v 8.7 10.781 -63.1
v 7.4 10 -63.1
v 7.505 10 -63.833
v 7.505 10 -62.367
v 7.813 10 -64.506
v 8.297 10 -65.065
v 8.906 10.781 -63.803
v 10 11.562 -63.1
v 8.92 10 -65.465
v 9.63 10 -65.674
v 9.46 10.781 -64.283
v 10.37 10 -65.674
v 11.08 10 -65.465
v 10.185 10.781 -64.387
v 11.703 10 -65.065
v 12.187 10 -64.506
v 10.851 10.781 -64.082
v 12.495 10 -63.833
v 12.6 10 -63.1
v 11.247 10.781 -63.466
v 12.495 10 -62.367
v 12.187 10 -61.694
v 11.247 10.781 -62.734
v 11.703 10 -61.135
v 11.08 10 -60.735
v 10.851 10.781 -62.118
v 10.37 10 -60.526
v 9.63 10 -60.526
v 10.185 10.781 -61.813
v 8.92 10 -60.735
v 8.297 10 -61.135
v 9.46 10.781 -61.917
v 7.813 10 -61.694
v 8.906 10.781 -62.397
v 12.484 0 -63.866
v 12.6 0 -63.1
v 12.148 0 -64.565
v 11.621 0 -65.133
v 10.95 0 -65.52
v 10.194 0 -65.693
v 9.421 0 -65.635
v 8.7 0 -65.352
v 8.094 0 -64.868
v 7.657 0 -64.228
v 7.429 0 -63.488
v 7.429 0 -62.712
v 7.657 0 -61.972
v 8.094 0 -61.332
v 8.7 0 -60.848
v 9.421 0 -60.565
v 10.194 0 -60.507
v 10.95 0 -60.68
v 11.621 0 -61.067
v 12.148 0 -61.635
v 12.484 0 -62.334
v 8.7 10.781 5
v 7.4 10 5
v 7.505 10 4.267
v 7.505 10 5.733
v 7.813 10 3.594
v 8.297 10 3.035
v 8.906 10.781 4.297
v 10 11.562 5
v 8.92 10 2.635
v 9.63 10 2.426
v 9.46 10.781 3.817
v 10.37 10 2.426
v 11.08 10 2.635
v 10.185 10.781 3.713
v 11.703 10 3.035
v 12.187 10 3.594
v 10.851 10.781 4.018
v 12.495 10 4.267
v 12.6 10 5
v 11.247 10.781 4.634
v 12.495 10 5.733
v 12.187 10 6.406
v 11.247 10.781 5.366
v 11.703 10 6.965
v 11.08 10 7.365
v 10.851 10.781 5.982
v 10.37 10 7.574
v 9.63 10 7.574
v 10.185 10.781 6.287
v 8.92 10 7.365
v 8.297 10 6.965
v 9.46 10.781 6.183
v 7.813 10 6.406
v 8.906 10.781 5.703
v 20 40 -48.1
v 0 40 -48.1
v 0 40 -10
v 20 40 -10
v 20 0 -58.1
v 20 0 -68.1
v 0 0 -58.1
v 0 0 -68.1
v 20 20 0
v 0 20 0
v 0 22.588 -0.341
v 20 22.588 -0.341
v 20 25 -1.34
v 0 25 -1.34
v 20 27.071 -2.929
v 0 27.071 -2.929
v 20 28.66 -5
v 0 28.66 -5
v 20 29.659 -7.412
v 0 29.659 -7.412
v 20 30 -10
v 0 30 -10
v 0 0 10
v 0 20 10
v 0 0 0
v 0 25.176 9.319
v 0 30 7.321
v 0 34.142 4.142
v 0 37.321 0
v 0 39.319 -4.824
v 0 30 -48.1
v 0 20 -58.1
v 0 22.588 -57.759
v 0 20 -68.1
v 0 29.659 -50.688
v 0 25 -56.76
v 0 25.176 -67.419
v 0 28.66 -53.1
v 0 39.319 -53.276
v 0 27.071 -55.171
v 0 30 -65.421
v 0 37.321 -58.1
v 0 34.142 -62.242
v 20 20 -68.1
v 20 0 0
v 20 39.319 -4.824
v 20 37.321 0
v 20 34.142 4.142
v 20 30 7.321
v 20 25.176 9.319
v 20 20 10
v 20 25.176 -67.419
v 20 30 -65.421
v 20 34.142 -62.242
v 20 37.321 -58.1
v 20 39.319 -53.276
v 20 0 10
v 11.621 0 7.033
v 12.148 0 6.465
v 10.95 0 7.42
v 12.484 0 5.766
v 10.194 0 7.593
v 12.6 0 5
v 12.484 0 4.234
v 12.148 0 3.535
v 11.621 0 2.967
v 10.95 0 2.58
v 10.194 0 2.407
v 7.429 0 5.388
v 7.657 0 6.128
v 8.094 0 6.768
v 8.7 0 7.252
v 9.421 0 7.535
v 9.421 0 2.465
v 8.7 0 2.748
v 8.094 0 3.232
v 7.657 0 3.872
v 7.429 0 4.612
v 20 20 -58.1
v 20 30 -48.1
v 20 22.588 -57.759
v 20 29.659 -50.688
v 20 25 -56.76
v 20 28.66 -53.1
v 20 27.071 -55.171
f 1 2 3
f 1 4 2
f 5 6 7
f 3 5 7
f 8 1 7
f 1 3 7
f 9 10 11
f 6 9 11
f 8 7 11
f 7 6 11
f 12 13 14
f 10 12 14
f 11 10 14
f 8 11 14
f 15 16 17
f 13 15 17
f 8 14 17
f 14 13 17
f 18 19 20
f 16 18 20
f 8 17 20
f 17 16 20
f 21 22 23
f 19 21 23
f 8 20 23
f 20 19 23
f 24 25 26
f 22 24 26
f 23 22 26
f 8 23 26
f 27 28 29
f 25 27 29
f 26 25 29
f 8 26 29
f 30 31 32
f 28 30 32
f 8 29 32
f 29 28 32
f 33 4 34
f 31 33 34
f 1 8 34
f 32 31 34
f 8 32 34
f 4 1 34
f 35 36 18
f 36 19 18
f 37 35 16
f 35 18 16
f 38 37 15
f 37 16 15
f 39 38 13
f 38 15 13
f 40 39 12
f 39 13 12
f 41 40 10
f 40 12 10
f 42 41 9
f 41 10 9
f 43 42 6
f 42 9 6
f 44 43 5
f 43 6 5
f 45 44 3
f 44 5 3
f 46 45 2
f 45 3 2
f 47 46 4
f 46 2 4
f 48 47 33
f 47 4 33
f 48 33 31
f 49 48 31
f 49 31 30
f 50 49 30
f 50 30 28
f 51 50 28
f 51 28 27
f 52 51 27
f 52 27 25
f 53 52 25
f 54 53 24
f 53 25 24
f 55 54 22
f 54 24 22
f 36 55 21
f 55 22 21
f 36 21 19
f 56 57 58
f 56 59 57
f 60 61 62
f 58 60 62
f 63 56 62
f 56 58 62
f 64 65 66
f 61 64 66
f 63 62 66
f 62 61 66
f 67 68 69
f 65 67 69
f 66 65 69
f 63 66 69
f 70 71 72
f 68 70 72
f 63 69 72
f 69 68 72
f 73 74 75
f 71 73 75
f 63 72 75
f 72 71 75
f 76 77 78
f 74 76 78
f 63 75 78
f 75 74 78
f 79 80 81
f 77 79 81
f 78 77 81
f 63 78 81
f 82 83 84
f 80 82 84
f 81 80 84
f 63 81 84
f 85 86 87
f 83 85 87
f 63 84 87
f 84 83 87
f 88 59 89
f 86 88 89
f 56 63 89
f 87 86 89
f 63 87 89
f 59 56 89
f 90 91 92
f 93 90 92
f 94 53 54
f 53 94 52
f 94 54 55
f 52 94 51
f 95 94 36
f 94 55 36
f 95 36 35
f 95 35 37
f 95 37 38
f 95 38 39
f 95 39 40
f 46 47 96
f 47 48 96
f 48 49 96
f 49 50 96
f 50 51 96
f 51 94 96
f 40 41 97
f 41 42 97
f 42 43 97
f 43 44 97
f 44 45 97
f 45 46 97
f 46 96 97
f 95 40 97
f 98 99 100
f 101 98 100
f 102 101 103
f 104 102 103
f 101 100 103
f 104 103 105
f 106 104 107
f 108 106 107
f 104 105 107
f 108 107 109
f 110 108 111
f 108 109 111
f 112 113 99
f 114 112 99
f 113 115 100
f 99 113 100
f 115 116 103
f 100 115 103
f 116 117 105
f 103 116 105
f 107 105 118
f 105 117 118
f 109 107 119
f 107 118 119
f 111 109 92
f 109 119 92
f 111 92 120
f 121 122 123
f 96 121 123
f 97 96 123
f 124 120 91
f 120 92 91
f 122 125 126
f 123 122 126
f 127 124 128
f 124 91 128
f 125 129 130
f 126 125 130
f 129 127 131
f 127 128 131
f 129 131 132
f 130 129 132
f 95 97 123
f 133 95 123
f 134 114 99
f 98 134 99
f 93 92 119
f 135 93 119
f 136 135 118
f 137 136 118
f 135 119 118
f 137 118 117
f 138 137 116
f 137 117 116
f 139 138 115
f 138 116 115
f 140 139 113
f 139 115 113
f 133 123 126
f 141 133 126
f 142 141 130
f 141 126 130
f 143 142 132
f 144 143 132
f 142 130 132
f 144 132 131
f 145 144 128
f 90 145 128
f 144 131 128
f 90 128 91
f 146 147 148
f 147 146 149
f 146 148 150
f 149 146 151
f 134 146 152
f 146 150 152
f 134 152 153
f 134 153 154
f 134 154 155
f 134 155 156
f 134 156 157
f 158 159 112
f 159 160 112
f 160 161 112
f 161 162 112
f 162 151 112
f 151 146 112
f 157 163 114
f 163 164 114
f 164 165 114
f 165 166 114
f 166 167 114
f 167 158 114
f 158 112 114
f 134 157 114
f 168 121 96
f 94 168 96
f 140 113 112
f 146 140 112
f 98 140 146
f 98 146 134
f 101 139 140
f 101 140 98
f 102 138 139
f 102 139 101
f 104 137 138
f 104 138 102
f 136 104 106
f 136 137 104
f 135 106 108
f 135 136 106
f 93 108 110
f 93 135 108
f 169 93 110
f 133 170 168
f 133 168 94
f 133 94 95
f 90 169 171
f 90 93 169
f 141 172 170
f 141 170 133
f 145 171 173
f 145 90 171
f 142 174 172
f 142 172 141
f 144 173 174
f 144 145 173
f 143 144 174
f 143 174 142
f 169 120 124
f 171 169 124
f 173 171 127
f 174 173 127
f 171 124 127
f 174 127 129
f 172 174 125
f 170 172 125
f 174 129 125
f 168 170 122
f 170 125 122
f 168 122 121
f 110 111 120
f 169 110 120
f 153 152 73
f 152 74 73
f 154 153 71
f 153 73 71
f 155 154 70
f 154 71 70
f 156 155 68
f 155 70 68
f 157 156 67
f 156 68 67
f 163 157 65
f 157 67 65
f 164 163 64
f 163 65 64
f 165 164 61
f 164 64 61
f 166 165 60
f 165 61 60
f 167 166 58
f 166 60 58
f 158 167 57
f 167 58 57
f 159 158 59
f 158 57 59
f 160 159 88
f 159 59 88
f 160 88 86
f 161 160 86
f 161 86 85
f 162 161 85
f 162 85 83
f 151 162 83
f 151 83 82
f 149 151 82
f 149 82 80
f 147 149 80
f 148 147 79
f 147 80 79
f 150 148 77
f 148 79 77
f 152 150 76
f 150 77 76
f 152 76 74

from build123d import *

# Parameters (mm, degrees)
SM_BASE_FLANGE_1_DEPTH = 20
HOLE_WIZARD_M51_D      = 5.2
HOLE_WIZARD_M51_DEPTH  = 10
HOLE_WIZARD_M51_TIP    = 1.562237609


# Sheet-metal steps are written as plain solids
with BuildPart() as part:
    # Sketch 1 → Базовая кромка1 (new body)
    with BuildSketch(Plane(origin=(0, 0, 0), x_dir=(0, 0, -1), z_dir=(1, 0, 0))):
        with BuildLine():
            Line((0, 0), (0, 20))
            ThreePointArc((0, 20), (2.928932188, 27.071067812), (10, 30))
            Line((10, 30), (48.1, 30))
            ThreePointArc((48.1, 30), (55.171067812, 27.071067812), (58.1, 20))
            Line((58.1, 20), (58.1, 0))
            Line((58.1, 0), (68.1, 0))
            Line((68.1, 0), (68.1, 20))
            ThreePointArc((68.1, 20), (62.242135624, 34.142135624), (48.1, 40))
            Line((48.1, 40), (10, 40))
            ThreePointArc((10, 40), (-4.142135624, 34.142135624), (-10, 20))
            Line((-10, 20), (-10, 0))
            Line((-10, 0), (0, 0))
        make_face()
    extrude(amount=SM_BASE_FLANGE_1_DEPTH)

    # Сверло под метчик  спиральное M51
    with Locations(Plane(origin=(0, 0, 0), x_dir=(-1, 0, 0), z_dir=(0, -1, 0))):
        with Locations((-10, 63.1), (-10, -5)):
            Hole(HOLE_WIZARD_M51_D / 2, depth=HOLE_WIZARD_M51_DEPTH)
            with Locations((0, 0, -(HOLE_WIZARD_M51_DEPTH + HOLE_WIZARD_M51_TIP / 2))):  # 118° drill point
                Cone(0, HOLE_WIZARD_M51_D / 2, HOLE_WIZARD_M51_TIP, mode=Mode.SUBTRACT)


solid = part.part
